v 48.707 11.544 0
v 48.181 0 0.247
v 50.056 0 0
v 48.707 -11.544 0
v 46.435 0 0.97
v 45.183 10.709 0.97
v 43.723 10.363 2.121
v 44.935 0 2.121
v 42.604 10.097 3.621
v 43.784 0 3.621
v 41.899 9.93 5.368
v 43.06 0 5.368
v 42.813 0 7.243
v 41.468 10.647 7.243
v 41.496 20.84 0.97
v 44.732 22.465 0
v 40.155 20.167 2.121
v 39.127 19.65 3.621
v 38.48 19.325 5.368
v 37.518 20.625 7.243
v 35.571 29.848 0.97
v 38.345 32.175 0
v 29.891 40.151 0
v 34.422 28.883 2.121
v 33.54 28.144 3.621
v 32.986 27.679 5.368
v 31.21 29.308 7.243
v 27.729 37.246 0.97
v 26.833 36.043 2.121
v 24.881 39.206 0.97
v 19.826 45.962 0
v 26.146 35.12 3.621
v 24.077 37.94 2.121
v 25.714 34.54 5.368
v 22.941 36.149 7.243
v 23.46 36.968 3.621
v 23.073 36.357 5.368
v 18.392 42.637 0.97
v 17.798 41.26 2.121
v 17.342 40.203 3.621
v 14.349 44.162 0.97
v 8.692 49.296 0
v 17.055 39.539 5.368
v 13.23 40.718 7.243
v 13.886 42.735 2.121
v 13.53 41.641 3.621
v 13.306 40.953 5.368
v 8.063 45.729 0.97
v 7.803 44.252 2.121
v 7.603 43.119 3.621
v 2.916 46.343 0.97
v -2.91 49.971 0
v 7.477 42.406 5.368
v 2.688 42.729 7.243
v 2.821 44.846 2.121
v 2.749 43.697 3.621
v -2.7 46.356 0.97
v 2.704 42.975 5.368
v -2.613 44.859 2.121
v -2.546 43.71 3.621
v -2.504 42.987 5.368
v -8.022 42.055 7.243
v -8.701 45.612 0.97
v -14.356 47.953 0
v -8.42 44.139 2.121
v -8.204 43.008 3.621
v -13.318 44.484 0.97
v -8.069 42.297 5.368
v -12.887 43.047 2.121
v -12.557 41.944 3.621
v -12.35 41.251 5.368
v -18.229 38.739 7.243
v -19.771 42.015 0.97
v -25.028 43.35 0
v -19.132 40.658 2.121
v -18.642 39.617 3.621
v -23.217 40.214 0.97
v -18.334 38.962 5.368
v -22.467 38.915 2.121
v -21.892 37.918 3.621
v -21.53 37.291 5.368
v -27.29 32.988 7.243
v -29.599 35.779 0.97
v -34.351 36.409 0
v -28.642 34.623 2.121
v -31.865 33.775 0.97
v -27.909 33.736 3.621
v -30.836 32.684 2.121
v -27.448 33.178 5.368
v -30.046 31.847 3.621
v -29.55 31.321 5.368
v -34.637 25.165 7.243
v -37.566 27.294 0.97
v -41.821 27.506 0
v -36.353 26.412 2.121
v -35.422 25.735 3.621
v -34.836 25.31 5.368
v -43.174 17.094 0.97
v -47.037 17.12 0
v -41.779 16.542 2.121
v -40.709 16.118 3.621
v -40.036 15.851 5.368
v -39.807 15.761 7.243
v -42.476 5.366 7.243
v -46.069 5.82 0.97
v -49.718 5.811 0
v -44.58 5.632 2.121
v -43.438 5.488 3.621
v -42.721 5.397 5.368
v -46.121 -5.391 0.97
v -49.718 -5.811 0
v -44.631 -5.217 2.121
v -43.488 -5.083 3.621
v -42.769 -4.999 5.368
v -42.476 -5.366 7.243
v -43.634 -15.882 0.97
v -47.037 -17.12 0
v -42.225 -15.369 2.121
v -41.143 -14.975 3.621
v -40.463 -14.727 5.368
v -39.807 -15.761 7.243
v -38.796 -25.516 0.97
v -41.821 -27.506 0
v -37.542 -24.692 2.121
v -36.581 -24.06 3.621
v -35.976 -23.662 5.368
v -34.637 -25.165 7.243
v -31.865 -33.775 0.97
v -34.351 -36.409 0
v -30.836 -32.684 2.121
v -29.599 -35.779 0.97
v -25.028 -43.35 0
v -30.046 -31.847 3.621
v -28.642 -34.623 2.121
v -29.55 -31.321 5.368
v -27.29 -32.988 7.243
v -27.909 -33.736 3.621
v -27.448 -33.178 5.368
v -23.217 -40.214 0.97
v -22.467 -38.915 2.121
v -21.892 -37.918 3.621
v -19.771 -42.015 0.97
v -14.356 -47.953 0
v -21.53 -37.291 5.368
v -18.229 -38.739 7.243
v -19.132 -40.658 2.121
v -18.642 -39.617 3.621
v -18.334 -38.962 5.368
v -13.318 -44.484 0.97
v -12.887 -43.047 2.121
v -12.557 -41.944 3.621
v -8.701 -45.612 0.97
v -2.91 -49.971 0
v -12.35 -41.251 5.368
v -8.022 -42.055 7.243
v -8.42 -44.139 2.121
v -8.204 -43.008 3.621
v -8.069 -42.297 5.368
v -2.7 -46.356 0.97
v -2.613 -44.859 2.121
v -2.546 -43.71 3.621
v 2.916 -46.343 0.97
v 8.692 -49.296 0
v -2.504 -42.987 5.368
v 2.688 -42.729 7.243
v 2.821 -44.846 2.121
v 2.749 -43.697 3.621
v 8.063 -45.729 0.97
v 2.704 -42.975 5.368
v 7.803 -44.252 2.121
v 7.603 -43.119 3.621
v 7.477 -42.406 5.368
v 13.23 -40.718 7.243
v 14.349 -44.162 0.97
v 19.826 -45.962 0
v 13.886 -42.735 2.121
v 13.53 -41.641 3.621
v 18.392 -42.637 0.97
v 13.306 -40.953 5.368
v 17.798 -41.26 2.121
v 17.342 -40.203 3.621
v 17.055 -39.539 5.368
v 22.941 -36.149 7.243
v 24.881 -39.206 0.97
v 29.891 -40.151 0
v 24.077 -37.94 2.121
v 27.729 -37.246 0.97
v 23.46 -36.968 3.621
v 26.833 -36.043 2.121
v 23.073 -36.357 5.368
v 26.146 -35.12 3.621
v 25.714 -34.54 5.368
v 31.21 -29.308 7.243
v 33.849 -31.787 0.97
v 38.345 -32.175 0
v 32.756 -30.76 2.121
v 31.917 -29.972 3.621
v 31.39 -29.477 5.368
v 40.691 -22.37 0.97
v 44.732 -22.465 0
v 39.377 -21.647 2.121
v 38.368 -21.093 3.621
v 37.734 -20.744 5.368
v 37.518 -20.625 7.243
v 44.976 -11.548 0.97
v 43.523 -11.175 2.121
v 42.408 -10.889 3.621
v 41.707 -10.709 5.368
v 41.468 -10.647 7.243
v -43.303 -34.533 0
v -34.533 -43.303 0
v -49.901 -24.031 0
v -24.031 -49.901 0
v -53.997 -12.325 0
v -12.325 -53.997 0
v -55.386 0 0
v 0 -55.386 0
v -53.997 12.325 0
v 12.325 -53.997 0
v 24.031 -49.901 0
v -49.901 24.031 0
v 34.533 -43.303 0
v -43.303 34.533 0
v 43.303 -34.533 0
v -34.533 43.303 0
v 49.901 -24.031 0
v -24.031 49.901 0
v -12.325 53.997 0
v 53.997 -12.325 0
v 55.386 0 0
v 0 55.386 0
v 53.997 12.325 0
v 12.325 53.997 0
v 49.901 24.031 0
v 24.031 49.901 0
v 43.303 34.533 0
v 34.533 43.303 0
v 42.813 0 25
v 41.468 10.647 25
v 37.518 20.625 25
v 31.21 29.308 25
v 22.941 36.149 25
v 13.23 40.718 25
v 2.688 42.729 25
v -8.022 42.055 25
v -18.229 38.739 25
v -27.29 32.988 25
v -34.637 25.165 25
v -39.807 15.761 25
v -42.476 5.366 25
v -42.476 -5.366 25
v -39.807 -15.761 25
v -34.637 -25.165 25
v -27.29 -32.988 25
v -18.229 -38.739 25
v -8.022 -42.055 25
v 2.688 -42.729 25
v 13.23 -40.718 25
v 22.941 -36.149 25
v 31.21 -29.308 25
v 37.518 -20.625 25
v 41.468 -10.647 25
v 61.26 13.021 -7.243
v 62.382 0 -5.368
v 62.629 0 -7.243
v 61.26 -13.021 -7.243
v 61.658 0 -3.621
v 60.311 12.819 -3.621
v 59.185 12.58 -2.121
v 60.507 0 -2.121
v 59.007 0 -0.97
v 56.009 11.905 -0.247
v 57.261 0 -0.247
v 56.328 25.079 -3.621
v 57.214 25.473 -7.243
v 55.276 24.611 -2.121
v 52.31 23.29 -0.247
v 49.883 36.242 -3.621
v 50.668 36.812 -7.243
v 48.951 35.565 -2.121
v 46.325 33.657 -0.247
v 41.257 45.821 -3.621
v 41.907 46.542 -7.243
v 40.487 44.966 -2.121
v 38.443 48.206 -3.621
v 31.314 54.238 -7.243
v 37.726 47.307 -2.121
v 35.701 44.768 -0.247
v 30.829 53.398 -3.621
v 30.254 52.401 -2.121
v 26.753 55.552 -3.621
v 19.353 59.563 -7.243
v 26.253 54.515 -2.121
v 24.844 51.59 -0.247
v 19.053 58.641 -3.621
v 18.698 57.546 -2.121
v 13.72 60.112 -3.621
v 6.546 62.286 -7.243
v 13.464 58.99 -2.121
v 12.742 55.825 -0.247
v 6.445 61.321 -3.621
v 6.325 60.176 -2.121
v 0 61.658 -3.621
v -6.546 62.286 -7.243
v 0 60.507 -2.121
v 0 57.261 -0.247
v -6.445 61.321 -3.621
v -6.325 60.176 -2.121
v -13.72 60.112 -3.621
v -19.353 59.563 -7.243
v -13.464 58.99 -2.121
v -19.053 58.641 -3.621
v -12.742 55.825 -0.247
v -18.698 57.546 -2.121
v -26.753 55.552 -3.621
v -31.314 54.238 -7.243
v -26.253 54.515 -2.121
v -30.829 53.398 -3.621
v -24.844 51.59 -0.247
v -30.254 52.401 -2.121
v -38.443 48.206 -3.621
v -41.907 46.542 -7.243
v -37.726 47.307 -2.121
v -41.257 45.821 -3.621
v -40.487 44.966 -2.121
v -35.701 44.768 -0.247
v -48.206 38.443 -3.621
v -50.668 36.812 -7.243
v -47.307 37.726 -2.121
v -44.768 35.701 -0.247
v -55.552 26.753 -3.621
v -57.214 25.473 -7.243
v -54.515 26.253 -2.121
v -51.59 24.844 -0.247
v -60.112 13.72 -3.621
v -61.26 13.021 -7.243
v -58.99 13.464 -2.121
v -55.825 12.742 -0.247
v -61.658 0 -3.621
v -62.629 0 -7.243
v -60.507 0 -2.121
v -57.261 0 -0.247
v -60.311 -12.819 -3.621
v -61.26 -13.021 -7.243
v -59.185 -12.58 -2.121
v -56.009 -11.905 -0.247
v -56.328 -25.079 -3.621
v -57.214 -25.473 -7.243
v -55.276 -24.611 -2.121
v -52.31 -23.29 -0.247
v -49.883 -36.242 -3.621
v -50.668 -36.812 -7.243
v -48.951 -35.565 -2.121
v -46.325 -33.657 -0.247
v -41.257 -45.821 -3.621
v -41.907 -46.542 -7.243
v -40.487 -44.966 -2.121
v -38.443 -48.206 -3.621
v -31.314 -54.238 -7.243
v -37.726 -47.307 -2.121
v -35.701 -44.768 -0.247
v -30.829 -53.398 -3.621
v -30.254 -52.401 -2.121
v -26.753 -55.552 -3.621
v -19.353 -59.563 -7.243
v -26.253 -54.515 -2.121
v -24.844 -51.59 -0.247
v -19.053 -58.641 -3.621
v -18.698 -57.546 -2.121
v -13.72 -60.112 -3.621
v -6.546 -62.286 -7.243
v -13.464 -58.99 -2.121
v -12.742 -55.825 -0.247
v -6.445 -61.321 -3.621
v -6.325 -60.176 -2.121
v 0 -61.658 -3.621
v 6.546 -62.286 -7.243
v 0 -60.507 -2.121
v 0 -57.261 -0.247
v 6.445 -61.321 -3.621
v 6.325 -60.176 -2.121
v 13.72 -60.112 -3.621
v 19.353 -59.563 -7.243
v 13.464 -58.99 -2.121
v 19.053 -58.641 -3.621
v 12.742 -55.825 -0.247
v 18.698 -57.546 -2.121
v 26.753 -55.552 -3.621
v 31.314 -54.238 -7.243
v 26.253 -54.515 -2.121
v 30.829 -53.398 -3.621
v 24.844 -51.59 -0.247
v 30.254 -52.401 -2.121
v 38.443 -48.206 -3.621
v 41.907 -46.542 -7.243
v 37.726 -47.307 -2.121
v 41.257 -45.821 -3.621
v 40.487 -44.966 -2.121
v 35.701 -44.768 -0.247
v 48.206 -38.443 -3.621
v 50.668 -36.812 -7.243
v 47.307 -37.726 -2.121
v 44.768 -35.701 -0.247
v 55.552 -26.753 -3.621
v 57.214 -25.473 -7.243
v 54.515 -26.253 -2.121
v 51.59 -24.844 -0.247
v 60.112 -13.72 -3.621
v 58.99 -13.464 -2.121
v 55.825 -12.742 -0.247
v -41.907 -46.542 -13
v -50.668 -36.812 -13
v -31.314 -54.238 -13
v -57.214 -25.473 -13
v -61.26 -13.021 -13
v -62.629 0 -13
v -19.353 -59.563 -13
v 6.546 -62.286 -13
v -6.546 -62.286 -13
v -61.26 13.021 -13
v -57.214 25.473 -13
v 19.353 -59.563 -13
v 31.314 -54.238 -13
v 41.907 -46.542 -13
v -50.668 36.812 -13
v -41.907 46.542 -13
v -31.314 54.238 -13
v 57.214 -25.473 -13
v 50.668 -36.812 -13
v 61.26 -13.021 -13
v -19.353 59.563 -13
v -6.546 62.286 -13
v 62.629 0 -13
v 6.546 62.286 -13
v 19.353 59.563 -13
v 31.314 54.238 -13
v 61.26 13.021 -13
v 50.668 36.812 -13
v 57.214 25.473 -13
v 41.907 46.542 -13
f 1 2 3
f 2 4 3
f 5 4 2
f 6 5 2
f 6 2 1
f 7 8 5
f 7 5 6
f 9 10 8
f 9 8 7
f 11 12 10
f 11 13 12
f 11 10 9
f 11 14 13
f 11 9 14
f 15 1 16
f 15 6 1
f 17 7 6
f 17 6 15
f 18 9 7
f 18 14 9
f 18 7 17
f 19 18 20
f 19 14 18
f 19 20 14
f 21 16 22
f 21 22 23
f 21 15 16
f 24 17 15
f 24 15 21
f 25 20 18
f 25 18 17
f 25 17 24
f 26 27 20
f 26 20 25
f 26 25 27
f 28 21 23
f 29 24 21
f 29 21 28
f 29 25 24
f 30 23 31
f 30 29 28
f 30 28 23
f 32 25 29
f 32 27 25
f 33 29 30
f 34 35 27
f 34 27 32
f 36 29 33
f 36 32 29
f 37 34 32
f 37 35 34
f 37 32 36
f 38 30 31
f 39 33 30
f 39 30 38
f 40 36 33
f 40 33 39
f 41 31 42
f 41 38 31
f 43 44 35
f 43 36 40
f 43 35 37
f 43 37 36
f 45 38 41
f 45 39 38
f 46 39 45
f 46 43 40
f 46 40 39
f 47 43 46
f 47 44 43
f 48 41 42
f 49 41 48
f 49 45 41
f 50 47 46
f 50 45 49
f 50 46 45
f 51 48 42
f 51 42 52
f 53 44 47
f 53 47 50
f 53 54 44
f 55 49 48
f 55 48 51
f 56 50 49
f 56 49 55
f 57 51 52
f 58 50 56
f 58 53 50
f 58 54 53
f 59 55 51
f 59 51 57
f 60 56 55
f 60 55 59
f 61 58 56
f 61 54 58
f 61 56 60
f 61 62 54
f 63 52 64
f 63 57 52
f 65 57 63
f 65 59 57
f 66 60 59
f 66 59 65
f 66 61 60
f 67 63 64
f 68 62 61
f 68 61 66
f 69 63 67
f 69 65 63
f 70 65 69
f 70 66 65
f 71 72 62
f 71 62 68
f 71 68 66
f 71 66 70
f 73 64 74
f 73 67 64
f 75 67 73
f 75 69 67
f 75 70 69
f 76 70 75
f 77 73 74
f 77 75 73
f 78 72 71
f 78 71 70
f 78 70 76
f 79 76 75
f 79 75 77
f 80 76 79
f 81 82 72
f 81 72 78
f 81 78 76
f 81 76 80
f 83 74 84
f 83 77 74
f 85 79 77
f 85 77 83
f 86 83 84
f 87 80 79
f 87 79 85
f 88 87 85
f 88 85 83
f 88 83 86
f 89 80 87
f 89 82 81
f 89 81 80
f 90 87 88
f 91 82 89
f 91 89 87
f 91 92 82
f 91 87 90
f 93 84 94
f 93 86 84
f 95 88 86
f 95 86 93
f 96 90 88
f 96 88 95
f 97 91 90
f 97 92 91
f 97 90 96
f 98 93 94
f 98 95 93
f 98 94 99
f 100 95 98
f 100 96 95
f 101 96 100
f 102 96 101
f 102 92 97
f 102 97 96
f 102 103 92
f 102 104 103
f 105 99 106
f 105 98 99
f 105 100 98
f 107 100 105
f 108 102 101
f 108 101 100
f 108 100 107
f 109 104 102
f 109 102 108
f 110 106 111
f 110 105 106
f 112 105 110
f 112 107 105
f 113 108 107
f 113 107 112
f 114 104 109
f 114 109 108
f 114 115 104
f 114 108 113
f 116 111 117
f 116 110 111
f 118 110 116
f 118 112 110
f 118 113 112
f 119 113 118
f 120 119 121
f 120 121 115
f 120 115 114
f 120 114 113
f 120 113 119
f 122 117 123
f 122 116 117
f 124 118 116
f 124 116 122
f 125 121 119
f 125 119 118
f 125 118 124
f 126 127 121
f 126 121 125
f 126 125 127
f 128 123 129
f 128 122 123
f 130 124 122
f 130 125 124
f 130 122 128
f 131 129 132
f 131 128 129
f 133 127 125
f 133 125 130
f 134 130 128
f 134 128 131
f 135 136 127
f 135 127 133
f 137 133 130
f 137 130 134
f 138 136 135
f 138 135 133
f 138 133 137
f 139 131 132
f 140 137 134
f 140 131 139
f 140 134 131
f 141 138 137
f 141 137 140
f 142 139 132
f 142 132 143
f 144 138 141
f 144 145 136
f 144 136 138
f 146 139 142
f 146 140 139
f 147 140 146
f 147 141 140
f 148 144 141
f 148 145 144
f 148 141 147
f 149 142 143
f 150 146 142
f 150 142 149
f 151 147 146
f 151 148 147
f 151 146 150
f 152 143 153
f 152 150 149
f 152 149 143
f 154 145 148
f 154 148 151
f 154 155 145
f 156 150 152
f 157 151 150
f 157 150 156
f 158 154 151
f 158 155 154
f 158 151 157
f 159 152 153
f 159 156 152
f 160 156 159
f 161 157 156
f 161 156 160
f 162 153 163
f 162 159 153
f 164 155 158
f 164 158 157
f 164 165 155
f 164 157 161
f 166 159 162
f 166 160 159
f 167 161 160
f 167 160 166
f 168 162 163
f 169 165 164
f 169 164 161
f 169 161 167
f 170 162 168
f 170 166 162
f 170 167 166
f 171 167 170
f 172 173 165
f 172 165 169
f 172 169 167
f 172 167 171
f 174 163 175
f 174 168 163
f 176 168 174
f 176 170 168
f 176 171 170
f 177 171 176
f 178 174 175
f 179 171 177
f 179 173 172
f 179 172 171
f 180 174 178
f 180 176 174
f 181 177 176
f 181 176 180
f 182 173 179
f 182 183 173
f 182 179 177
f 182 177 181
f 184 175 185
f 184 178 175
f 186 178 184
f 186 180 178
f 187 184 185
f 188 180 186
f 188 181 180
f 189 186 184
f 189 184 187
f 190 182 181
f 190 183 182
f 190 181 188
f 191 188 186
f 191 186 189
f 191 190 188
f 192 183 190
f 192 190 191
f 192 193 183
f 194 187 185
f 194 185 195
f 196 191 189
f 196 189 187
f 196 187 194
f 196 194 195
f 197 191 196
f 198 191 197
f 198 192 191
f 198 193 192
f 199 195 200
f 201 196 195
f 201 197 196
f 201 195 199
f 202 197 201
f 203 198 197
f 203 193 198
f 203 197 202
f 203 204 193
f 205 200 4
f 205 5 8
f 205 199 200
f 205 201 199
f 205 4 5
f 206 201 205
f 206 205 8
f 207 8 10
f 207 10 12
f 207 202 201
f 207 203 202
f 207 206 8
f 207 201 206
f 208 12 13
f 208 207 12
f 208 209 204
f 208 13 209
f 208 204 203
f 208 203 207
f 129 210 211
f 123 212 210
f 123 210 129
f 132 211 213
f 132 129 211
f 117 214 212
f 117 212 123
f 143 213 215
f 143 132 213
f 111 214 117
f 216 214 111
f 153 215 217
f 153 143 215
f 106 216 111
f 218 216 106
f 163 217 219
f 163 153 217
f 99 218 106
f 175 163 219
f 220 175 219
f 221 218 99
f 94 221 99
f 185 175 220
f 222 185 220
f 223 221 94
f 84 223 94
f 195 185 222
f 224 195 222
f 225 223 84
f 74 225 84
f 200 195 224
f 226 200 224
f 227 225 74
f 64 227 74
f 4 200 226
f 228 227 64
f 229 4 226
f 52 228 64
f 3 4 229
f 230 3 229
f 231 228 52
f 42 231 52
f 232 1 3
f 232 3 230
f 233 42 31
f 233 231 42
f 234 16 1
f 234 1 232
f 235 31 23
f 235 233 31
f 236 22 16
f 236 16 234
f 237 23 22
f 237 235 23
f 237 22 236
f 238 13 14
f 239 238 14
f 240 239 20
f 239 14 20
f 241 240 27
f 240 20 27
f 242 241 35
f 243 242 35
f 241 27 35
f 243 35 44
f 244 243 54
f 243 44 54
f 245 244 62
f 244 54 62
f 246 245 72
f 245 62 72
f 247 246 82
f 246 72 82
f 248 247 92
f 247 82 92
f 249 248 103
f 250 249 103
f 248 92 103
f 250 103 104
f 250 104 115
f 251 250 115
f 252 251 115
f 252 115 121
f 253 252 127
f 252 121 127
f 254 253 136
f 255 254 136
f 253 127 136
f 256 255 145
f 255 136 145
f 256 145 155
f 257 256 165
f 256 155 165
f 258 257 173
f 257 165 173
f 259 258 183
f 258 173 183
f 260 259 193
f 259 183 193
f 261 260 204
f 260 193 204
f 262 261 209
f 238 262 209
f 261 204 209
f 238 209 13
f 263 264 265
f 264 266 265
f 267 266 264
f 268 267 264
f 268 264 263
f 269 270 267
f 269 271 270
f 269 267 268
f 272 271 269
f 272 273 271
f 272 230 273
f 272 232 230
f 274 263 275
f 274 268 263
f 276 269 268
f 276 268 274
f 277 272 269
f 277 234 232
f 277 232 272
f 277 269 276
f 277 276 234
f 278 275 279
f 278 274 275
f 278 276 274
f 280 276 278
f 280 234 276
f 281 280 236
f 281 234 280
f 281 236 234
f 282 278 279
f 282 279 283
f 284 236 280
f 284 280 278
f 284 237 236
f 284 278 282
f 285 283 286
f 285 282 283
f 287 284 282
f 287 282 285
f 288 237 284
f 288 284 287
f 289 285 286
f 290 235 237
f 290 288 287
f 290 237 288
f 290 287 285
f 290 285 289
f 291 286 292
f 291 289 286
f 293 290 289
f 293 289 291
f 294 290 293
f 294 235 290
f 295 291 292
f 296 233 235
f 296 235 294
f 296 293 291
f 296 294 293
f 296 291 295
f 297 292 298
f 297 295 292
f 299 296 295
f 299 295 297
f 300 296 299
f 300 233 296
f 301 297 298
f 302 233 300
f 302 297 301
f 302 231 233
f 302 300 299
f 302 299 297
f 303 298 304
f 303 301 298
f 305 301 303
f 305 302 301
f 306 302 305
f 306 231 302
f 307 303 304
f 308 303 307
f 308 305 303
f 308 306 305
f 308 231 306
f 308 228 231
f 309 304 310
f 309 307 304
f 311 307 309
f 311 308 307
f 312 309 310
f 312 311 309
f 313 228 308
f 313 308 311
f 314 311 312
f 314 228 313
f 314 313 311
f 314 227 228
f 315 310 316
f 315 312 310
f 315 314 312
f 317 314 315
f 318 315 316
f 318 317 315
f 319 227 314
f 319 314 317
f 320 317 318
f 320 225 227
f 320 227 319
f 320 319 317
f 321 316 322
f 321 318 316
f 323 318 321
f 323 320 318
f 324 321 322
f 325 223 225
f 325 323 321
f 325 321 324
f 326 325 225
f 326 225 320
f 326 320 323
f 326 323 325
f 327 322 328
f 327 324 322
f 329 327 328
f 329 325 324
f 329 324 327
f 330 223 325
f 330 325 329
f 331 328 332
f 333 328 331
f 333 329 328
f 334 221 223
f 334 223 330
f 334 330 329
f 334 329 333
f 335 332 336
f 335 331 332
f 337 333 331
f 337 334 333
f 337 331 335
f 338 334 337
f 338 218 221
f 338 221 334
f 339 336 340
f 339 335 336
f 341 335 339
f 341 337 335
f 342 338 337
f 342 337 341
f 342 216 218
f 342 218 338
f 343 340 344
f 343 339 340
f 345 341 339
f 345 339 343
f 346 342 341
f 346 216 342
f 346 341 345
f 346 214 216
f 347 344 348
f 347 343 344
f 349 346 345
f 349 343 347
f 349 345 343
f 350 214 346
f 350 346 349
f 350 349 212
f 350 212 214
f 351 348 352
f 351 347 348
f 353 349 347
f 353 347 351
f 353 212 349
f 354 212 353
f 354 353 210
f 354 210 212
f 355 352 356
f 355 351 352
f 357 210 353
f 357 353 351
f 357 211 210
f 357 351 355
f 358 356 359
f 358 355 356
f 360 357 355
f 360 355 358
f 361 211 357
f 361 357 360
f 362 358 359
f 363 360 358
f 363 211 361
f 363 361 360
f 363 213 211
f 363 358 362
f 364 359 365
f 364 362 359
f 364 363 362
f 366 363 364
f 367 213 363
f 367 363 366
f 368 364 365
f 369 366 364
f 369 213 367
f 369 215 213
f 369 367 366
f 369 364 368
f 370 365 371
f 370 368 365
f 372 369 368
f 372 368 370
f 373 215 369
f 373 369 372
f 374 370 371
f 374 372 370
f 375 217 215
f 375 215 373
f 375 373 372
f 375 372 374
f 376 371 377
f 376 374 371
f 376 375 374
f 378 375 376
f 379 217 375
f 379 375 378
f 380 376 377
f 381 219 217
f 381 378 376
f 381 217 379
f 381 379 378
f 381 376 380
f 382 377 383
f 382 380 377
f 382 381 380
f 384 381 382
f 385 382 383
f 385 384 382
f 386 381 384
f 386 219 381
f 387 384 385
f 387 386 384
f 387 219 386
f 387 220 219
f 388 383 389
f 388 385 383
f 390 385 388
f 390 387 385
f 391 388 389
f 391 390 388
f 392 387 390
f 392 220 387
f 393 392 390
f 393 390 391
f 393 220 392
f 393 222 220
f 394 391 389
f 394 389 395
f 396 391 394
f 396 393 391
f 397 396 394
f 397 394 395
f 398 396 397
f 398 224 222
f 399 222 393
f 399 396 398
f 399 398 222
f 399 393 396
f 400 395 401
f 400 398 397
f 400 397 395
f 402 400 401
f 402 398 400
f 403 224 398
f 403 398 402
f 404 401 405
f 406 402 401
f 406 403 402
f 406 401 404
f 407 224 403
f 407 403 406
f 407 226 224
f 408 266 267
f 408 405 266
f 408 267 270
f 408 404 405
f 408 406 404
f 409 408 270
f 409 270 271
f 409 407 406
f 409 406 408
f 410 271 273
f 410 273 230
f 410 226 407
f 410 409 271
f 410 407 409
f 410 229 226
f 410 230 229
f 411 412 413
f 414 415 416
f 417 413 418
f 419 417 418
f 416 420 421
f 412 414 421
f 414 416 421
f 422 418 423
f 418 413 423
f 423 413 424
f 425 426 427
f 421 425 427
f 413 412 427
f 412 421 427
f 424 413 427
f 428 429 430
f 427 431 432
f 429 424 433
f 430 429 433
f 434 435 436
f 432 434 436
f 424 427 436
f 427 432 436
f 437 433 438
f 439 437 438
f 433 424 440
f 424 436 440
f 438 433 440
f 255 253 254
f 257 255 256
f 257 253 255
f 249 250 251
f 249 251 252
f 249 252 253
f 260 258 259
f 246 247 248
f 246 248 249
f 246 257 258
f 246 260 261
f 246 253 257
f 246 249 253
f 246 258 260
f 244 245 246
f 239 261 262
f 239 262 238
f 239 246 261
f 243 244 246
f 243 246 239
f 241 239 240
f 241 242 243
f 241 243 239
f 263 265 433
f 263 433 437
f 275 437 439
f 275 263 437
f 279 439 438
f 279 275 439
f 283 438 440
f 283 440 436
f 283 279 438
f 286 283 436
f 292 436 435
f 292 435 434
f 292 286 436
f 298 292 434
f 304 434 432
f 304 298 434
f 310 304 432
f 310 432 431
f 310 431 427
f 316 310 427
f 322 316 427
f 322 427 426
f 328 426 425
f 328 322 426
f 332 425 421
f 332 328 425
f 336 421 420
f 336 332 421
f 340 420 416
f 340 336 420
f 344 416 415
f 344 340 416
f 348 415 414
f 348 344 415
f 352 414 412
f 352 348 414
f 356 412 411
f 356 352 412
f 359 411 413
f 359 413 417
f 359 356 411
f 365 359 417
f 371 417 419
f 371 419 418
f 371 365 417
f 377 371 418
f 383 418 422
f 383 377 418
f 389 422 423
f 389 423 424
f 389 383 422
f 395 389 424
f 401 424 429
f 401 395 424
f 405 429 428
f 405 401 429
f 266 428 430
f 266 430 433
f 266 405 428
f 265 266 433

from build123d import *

# Parameters (mm, degrees)
F0_R     = 42.8133660757
F1_DEPTH = 25
F2_R     = 62.6286647671
F3_DEPTH = 13
F4_R     = 7.2426406871


with BuildPart() as f1:
    # F0 (on Top) → F1 (new body)
    with BuildSketch(Plane.XY):
        Circle(F0_R)
    extrude(amount=F1_DEPTH)

    # F2 (on Top) → F3 (join)
    with BuildSketch(Plane.XY):
        Circle(F2_R)
    extrude(amount=-F3_DEPTH)

    # F4
    f4_edges = [f1.edges().sort_by_distance(p)[0] for p in [
        (-62.628665, 0, 0),
        (-42.813366, 0, 0),
    ]]
    fillet(f4_edges, radius=F4_R)


solid = f1.part
